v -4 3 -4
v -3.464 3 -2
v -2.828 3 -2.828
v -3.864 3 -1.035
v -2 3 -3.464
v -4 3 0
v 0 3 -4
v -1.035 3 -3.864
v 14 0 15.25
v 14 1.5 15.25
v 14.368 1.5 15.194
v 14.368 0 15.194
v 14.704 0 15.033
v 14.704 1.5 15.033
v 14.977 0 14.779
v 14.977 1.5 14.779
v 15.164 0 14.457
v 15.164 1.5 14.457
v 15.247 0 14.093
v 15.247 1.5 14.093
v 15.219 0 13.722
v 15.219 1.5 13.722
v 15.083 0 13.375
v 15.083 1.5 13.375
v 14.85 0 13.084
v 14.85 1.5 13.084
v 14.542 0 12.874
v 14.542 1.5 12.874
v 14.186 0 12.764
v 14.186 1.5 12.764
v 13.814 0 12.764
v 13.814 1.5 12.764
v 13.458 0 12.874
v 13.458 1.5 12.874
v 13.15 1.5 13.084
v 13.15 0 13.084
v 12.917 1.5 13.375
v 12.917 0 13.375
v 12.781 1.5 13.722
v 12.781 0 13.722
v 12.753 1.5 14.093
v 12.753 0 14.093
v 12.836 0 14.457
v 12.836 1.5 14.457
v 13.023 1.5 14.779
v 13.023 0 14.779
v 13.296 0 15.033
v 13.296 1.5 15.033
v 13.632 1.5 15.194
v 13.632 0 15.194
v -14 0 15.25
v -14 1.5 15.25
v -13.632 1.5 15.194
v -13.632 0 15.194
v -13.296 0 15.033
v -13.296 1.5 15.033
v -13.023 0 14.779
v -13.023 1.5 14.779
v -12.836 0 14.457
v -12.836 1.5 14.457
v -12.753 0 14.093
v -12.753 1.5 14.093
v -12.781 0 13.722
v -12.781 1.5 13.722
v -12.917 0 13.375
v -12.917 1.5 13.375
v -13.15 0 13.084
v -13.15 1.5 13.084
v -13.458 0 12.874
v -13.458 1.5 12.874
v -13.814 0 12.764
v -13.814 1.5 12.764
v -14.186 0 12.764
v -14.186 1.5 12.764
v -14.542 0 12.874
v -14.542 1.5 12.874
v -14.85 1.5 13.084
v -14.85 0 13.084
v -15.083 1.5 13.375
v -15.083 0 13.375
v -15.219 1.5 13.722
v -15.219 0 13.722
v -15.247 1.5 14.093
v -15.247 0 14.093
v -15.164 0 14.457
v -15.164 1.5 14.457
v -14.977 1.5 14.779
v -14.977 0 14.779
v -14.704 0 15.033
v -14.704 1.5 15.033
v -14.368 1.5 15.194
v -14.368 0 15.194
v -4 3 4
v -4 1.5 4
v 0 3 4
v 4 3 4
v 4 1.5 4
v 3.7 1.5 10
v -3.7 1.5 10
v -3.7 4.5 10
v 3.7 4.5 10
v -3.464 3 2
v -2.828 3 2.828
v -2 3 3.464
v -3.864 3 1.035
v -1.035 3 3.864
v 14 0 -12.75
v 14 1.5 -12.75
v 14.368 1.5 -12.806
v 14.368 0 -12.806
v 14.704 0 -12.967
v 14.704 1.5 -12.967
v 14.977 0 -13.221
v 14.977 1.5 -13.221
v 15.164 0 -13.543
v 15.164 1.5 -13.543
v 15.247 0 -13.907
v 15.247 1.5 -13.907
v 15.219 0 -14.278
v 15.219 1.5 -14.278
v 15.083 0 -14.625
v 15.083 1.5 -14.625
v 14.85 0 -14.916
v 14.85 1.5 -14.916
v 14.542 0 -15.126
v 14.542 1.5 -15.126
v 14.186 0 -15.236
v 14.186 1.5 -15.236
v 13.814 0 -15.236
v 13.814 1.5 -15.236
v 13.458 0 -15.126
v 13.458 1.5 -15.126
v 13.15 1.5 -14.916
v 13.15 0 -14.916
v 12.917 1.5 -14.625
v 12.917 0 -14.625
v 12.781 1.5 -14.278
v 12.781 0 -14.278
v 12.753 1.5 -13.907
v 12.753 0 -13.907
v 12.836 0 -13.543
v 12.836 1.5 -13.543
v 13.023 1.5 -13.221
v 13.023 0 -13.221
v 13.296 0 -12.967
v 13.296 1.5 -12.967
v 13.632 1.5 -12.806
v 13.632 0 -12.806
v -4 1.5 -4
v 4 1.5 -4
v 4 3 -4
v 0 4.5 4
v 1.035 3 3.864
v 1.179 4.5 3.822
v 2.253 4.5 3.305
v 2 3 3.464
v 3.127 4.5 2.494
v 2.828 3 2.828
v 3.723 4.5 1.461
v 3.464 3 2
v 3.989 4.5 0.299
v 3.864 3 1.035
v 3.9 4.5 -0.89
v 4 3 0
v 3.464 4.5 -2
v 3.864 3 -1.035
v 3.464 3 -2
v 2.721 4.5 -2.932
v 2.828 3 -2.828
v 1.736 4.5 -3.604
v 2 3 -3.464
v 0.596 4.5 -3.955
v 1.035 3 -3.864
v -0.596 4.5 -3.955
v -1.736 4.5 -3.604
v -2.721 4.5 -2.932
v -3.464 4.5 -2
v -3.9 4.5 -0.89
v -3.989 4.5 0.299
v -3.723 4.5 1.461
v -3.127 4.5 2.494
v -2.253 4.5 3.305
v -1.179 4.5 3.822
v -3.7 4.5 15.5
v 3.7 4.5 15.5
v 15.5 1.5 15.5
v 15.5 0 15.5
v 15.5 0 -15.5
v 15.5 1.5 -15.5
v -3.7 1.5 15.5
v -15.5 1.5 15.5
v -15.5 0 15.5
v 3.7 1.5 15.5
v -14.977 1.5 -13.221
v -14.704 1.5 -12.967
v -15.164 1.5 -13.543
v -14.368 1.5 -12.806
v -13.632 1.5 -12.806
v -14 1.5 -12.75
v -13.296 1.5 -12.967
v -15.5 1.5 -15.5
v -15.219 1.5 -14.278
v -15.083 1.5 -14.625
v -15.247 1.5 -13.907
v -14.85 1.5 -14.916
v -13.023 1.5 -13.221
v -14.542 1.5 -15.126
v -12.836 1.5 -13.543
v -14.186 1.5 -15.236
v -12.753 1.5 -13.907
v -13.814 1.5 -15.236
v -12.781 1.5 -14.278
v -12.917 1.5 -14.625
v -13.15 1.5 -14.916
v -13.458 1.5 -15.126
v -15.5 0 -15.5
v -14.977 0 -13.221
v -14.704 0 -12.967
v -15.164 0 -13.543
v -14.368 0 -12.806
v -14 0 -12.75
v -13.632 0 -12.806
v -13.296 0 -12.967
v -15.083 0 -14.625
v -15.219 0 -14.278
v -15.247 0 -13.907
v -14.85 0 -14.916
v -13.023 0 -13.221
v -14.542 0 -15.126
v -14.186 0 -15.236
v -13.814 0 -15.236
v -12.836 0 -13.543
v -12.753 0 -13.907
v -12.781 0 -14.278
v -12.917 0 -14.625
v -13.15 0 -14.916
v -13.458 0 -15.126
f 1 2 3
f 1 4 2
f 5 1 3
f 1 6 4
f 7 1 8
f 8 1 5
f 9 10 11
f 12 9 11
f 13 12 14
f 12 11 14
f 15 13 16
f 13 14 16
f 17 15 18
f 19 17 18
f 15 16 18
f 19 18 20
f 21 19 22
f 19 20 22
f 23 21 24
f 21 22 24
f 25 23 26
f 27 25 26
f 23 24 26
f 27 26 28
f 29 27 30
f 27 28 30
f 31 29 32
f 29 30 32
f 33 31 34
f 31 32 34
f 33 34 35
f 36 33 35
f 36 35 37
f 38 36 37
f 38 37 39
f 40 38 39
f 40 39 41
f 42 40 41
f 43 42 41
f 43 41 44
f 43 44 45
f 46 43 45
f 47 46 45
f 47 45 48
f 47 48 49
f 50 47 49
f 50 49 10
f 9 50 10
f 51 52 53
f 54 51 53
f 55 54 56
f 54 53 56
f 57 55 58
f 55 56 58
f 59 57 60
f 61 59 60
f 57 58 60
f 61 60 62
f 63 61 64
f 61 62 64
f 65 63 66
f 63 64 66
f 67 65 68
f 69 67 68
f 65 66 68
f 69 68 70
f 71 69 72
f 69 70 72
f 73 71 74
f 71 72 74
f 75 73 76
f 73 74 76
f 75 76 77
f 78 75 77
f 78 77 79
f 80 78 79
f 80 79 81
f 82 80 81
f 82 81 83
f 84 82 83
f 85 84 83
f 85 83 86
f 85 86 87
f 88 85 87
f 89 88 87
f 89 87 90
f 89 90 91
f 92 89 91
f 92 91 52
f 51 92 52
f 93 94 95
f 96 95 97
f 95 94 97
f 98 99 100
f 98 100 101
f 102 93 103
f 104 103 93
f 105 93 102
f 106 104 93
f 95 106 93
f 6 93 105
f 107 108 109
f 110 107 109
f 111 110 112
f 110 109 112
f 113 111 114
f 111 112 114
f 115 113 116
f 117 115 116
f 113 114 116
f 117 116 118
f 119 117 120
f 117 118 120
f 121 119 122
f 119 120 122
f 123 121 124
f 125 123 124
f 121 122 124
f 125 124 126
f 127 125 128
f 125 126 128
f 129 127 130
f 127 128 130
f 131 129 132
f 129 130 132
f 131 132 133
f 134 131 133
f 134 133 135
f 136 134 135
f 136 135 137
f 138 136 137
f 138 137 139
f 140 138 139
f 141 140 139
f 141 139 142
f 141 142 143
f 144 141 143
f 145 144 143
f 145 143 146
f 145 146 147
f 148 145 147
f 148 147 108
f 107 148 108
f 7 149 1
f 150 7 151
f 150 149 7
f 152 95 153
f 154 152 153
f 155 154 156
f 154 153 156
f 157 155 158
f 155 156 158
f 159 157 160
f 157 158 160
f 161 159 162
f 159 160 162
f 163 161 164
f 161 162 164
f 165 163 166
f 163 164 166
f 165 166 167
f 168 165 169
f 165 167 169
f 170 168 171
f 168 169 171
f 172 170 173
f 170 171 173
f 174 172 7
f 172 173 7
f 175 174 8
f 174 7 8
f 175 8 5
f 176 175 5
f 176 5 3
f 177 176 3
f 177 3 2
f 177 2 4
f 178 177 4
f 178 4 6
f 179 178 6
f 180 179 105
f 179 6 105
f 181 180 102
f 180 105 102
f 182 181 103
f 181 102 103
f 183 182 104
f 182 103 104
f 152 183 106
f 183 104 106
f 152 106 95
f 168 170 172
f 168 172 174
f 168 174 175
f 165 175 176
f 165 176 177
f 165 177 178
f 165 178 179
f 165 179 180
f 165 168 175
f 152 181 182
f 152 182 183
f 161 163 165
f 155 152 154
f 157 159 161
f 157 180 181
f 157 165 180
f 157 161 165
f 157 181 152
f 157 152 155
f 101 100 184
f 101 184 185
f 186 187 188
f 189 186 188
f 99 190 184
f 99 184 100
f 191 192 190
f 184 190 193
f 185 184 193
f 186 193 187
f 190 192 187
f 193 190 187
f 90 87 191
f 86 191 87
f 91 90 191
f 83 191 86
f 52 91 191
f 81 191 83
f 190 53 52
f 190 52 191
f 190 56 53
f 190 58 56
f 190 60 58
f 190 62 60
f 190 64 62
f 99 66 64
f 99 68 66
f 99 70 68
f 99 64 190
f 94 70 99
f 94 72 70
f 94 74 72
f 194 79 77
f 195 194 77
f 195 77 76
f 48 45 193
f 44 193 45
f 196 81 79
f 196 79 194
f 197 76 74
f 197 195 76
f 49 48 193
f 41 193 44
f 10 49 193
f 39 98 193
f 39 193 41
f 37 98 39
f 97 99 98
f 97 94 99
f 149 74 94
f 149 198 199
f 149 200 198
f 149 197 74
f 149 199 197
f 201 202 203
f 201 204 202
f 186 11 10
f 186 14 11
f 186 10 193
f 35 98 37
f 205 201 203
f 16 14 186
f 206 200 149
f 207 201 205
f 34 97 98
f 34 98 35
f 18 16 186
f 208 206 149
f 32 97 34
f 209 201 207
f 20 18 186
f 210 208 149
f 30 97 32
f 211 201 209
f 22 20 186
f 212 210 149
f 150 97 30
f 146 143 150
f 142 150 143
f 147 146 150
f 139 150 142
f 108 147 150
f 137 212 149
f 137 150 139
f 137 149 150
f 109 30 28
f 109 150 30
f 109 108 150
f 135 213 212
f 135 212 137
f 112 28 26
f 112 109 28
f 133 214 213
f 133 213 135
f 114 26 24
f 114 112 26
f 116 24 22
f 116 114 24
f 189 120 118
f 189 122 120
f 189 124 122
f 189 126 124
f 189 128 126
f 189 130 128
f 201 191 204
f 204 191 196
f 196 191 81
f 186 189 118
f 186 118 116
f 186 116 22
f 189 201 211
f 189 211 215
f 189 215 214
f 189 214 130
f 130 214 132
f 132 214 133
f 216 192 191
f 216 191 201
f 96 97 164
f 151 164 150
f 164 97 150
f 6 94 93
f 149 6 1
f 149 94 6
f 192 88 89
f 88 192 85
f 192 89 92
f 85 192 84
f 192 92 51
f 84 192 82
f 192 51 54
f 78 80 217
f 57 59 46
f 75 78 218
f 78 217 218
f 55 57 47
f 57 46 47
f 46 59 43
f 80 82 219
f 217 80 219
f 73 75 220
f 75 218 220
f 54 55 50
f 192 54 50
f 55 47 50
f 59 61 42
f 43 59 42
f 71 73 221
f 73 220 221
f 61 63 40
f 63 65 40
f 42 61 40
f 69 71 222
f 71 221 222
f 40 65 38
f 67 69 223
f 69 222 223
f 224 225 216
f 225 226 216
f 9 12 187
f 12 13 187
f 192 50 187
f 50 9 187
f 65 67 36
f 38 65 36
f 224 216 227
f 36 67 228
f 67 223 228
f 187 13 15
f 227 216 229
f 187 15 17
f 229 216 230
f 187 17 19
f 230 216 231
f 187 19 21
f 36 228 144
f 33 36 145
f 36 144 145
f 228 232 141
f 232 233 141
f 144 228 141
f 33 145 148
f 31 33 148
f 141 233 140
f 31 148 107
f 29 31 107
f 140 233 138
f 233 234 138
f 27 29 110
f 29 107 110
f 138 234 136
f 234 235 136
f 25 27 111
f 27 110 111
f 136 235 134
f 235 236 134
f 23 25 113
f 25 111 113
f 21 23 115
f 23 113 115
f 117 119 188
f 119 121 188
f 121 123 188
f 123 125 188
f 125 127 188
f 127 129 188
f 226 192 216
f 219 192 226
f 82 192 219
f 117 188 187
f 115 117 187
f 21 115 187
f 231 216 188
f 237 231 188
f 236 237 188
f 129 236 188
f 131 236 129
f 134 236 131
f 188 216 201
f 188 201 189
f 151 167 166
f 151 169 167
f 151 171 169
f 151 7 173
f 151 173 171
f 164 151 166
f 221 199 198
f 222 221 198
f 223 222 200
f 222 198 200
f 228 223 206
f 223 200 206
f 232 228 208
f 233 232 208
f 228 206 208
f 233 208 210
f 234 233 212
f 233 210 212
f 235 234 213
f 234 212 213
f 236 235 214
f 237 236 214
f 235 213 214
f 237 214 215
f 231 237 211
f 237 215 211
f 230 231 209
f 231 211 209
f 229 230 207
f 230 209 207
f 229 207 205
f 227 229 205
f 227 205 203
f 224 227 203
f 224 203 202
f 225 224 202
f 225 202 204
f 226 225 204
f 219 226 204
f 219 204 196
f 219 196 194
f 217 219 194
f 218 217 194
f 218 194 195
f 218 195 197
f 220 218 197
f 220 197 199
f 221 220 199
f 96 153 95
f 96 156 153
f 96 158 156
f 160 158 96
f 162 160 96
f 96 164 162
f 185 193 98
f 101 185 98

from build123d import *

# Parameters (mm, degrees)
SKETCH1_W           = 31
SKETCH1_H           = 31
BOSS_EXTRUDE1_DEPTH = 1.5
SKETCH2_W           = 8
SKETCH2_H           = 8
BOSS_EXTRUDE2_DEPTH = 1.5
SKETCH3_R           = 4
BOSS_EXTRUDE3_DEPTH = 1.5
SKETCH4_W           = 7.4
SKETCH4_H           = 5.5
BOSS_EXTRUDE4_DEPTH = 3
SKETCH5_R           = 1.25
CUT_EXTRUDE1_DEPTH  = 23.12464689


with BuildPart() as part:
    # Sketch1 → Boss-Extrude1 (new body)
    with BuildSketch(Plane(origin=(0, 0, 0), x_dir=(1, 0, 0), z_dir=(0, 1, 0))):
        Rectangle(SKETCH1_W, SKETCH1_H)
    extrude(amount=BOSS_EXTRUDE1_DEPTH)

    # Sketch2 → Boss-Extrude2 (add)
    with BuildSketch(Plane(origin=(0, 1.5, 0), x_dir=(1, 0, 0), z_dir=(0, 1, 0))):
        Rectangle(SKETCH2_W, SKETCH2_H)
    extrude(amount=BOSS_EXTRUDE2_DEPTH)

    # Sketch3 → Boss-Extrude3 (add)
    with BuildSketch(Plane(origin=(0, 3, 0), x_dir=(1, 0, 0), z_dir=(0, 1, 0))):
        with Locations(Location((0, 0, 0), (0, 0, 270))):
            Circle(SKETCH3_R)
    extrude(amount=BOSS_EXTRUDE3_DEPTH)

    # Sketch4 → Boss-Extrude4 (add)
    with BuildSketch(Plane(origin=(0, 1.5, 0), x_dir=(1, 0, 0), z_dir=(0, 1, 0))):
        with Locations((0, -12.75)):
            Rectangle(SKETCH4_W, SKETCH4_H)
    extrude(amount=BOSS_EXTRUDE4_DEPTH)

    # Sketch5 → Cut-Extrude1 (cut, through all)
    with BuildSketch(Plane(origin=(0, 1.5, 0), x_dir=(1, 0, 0), z_dir=(0, 1, 0))):
        with Locations(Location((-14, 14, 0), (0, 0, 270))):
            Circle(SKETCH5_R)
        with Locations(Location((14, 14, 0), (0, 0, 270))):
            Circle(SKETCH5_R)
        with Locations(Location((14, -14, 0), (0, 0, 270))):
            Circle(SKETCH5_R)
        with Locations(Location((-14, -14, 0), (0, 0, 270))):
            Circle(SKETCH5_R)
    extrude(amount=-CUT_EXTRUDE1_DEPTH, mode=Mode.SUBTRACT)


solid = part.part
